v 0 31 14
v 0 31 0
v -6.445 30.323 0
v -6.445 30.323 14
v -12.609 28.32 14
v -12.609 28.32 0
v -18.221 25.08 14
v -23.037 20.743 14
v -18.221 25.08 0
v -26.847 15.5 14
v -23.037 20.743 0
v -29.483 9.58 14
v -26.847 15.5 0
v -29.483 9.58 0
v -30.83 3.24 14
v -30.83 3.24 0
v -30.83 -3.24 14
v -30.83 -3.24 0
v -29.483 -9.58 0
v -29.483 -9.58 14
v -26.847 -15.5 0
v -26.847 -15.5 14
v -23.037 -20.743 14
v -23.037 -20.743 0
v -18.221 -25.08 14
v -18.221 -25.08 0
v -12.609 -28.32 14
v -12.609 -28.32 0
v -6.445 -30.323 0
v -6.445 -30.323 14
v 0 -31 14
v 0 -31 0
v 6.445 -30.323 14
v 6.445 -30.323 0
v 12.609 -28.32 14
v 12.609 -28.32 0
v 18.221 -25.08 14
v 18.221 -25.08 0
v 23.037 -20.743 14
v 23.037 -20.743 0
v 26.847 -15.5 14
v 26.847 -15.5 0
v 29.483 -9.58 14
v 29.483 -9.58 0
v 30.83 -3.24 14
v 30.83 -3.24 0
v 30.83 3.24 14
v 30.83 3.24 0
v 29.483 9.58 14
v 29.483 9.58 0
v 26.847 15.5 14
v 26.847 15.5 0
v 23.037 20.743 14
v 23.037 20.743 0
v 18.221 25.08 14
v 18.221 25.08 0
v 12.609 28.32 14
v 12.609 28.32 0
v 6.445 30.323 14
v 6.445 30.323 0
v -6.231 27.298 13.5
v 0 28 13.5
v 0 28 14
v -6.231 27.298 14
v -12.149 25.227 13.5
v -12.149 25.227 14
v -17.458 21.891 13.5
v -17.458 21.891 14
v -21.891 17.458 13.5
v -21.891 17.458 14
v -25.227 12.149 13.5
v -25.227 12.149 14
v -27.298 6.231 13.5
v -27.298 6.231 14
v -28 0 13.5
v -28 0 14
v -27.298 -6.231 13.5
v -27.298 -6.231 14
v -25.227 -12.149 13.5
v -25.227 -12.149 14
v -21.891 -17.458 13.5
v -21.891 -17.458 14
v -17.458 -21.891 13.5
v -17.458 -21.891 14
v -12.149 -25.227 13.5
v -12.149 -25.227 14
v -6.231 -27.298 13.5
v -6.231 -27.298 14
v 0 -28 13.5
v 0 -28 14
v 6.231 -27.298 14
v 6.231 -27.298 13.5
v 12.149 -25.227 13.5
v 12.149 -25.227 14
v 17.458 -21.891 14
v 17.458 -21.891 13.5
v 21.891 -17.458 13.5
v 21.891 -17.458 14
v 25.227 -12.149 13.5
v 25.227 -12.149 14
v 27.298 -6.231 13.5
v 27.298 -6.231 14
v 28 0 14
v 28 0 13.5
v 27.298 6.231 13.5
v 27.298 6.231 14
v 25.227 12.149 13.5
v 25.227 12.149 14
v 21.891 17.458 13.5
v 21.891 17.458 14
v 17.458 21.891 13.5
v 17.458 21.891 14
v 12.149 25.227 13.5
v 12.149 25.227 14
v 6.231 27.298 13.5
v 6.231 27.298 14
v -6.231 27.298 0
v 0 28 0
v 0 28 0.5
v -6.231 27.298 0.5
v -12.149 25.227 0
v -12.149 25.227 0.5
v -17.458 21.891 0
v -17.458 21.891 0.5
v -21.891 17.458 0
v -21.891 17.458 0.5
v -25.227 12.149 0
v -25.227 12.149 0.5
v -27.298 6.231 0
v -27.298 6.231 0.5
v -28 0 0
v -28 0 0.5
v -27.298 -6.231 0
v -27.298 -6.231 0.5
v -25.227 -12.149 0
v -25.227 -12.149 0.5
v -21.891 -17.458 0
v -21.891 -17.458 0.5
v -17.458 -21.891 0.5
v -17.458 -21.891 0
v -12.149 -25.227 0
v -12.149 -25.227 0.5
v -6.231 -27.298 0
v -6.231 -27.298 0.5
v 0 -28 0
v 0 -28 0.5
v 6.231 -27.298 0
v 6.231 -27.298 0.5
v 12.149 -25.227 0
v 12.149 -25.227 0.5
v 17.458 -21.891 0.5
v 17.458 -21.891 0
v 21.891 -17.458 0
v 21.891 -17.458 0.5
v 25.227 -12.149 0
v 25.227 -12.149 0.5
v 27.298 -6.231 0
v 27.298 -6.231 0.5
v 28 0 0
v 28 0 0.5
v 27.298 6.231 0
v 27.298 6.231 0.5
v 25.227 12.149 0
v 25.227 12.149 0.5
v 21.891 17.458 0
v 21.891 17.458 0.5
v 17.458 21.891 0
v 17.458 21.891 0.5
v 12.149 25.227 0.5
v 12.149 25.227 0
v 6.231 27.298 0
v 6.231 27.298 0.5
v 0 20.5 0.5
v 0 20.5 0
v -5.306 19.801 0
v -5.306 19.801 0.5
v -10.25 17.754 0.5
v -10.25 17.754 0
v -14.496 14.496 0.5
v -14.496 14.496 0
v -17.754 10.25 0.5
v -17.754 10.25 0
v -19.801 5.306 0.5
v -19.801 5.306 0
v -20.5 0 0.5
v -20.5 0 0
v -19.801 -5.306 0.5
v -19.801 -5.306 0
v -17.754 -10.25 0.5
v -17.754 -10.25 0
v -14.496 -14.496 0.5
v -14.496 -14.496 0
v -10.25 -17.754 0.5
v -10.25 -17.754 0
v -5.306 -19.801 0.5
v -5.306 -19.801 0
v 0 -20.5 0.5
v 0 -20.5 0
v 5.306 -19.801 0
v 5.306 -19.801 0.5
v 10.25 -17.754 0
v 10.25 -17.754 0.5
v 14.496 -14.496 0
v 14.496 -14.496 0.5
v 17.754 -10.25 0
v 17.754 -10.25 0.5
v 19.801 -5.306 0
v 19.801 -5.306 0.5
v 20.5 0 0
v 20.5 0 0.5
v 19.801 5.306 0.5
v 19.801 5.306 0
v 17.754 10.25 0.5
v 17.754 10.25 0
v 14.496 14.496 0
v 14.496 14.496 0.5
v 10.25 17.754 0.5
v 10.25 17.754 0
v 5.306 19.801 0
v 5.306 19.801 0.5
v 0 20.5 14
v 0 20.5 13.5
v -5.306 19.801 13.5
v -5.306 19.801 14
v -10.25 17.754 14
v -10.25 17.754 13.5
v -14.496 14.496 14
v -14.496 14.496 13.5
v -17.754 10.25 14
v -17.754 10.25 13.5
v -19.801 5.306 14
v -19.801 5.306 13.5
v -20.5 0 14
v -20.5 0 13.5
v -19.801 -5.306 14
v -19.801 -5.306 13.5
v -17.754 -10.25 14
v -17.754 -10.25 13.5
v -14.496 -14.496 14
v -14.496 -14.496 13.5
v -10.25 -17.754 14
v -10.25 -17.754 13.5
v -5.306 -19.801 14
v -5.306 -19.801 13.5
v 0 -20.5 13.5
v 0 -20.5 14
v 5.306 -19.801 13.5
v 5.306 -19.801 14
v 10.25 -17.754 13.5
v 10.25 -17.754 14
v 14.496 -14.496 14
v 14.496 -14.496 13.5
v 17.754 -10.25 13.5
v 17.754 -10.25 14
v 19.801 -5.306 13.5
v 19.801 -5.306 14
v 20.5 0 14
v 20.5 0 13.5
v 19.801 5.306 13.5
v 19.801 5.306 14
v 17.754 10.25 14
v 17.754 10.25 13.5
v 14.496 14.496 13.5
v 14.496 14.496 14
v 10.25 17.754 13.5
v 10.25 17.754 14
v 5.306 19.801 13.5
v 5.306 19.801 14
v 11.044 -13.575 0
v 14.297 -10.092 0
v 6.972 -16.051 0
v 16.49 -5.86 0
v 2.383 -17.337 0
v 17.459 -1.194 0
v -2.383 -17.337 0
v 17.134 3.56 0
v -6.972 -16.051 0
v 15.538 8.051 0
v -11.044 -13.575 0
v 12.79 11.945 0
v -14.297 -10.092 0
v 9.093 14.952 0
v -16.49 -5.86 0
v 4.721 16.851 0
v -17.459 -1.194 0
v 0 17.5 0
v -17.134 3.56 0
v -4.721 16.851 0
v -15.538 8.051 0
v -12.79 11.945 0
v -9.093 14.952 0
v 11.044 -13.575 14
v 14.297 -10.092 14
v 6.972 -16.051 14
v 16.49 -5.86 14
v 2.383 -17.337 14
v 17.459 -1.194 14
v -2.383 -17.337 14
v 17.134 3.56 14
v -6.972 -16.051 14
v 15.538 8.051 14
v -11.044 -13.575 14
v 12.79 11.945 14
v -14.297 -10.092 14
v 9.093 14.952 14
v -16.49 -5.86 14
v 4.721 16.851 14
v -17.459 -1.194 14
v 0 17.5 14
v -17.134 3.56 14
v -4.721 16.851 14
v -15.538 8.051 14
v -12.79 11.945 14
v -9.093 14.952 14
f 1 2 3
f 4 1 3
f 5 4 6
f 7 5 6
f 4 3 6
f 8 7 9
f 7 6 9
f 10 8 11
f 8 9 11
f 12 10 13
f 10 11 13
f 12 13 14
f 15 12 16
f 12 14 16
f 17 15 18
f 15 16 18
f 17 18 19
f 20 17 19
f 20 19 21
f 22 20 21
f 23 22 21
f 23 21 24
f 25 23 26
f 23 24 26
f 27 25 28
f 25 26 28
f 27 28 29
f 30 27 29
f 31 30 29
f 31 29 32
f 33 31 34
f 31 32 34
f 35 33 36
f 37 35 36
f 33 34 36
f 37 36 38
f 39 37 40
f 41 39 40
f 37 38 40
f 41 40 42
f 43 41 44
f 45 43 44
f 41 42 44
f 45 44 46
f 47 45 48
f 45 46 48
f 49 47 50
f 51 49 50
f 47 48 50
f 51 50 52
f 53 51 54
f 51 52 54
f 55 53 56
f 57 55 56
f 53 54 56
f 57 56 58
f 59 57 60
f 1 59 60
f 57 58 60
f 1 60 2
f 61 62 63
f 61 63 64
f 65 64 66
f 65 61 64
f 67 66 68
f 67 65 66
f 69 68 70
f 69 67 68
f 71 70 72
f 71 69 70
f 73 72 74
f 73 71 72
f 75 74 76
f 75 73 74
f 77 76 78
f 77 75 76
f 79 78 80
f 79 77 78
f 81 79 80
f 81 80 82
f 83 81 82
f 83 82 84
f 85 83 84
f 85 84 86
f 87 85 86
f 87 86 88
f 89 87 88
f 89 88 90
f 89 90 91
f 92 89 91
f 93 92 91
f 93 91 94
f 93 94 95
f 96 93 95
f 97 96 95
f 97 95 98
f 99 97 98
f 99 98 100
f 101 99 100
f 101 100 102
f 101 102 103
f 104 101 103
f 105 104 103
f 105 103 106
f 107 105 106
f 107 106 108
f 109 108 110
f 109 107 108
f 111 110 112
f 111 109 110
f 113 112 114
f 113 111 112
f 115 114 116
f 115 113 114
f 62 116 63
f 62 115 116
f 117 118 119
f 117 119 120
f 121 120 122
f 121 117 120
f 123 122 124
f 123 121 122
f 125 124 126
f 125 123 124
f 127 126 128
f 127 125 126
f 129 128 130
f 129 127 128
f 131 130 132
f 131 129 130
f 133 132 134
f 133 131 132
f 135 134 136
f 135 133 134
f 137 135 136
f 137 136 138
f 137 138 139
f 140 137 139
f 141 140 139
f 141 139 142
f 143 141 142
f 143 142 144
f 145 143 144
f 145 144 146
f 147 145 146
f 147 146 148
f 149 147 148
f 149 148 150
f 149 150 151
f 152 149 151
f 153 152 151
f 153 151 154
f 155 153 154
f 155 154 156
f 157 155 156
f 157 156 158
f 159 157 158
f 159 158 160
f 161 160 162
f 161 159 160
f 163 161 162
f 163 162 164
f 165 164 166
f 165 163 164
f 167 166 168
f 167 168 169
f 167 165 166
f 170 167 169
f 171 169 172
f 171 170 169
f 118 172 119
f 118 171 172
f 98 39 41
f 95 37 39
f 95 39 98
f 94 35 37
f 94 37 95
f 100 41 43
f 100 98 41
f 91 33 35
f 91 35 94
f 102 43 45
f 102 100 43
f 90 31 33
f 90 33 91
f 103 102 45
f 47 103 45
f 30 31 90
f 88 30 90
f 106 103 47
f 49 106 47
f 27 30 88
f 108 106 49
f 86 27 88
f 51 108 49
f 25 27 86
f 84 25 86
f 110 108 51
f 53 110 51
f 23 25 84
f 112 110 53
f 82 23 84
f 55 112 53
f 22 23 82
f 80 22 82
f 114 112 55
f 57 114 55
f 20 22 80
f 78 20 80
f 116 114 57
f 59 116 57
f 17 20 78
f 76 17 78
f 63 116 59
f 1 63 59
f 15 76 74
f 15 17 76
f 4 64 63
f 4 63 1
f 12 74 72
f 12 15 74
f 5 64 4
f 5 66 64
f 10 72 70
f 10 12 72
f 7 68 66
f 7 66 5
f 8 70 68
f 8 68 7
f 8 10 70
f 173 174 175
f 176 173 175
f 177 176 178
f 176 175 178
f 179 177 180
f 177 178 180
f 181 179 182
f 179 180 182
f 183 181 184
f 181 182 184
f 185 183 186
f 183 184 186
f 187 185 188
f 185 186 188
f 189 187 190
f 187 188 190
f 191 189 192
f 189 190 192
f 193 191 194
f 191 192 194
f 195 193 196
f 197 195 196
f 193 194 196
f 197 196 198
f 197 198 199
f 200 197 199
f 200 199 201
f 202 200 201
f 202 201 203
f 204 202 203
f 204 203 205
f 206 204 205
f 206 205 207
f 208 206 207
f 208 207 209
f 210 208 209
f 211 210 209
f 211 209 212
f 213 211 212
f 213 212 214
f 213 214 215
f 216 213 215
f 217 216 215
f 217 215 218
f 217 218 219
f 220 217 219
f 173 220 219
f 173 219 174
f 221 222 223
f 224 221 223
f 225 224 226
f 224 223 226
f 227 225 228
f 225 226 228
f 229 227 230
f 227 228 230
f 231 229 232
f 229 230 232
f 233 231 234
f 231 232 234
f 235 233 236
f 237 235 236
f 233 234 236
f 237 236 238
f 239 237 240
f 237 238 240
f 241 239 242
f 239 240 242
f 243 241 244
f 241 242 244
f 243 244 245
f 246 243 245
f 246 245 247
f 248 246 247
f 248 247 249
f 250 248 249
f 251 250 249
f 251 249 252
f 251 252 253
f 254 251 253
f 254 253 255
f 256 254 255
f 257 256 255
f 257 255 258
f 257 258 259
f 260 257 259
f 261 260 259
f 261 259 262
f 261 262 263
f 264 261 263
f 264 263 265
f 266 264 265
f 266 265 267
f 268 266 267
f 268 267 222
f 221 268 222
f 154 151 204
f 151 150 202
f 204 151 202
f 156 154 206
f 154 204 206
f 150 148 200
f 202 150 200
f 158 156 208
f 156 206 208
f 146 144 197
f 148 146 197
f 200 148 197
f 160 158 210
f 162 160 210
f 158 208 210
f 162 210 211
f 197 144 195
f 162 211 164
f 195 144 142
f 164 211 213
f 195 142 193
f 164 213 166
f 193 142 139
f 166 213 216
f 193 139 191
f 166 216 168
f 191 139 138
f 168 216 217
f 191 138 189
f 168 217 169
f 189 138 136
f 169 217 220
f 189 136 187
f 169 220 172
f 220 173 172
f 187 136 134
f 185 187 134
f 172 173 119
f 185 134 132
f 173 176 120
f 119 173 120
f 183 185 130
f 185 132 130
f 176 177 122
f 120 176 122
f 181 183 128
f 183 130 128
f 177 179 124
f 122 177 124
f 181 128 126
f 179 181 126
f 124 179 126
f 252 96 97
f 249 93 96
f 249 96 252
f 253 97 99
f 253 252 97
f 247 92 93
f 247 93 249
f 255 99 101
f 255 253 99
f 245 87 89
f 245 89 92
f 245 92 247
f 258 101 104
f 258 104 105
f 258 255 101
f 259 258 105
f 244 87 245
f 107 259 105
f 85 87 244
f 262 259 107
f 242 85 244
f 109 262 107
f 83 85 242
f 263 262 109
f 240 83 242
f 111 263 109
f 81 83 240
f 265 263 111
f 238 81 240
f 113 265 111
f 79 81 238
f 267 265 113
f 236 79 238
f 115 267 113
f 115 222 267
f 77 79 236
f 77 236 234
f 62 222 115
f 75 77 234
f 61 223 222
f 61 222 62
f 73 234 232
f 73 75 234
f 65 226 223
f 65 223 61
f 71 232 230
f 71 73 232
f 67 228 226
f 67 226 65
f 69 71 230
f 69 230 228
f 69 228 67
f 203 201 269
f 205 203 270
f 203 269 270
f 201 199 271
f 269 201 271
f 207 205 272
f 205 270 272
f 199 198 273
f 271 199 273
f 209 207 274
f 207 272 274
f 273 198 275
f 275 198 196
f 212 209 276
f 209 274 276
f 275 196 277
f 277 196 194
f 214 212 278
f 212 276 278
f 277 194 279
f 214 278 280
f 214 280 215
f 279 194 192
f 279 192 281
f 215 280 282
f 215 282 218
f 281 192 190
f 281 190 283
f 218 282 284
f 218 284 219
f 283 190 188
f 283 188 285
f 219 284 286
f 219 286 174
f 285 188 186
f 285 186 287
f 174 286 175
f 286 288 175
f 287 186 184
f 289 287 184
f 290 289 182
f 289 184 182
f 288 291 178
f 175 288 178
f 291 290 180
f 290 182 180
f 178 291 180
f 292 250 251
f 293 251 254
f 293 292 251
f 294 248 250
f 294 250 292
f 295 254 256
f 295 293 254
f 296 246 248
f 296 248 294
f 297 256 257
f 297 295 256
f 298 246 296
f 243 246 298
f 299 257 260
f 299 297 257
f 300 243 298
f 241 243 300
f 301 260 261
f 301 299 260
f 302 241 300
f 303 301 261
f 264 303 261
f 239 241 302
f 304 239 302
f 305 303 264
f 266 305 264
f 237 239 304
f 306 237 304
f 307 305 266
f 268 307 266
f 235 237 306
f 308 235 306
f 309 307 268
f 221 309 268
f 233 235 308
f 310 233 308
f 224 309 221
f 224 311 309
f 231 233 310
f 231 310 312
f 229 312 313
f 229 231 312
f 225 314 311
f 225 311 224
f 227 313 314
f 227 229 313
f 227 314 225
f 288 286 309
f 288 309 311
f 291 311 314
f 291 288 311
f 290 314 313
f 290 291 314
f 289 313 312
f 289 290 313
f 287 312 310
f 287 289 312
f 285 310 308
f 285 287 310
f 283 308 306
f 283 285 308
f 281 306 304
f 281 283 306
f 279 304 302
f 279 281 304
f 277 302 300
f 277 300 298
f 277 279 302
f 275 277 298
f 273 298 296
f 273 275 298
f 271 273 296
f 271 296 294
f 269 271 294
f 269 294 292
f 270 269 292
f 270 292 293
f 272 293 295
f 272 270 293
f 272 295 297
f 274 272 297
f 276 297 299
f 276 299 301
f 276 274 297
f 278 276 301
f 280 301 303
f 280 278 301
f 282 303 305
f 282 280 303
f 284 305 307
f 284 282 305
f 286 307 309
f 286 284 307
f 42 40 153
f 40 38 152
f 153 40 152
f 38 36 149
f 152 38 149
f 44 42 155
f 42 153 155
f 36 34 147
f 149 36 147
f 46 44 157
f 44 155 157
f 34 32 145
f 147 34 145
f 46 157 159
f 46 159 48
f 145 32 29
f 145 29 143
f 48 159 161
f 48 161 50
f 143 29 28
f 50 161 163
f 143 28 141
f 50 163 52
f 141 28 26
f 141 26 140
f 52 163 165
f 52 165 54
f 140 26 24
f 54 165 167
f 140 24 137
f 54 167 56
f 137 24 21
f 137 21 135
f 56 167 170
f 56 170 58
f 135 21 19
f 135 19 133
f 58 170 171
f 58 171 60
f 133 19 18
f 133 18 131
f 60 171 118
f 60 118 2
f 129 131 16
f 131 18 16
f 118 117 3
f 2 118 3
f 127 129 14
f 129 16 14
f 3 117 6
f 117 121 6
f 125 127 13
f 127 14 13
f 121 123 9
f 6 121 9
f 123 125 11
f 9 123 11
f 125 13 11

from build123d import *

# Parameters (mm, degrees)
SKETCH1_R             = 31
SKETCH1_R_2           = 28
BOSS_EXTRUDE1_DEPTH   = 14
SKETCH1_R_3           = 20.5
SKETCH1_R_4           = 17.5
BOSS_EXTRUDE1_2_DEPTH = 14
BOSS_EXTRUDE2_START   = 0.5
SKETCH1_3_R           = 28
SKETCH1_3_R_2         = 20.5
BOSS_EXTRUDE2_DEPTH   = 13


with BuildPart() as part:
    # Sketch1 → Boss-Extrude1 (new body)
    with BuildSketch(Plane(origin=(0, 0, 0), x_dir=(0, 1, 0), z_dir=(0, 0, 1))):
        Circle(SKETCH1_R)
        Circle(SKETCH1_R_2, mode=Mode.SUBTRACT)
    extrude(amount=BOSS_EXTRUDE1_DEPTH)



with BuildPart() as body_2:
    # Sketch1 → Boss-Extrude1 2 (new body)
    with BuildSketch(Plane(origin=(0, 0, 0), x_dir=(0, 1, 0), z_dir=(0, 0, 1))):
        Circle(SKETCH1_R_3)
        Circle(SKETCH1_R_4, mode=Mode.SUBTRACT)
    extrude(amount=BOSS_EXTRUDE1_2_DEPTH)


with BuildPart() as part_1:
    add(part.part)

    add(body_2.part)  # Boss-Extrude2 merges body 2
    # Sketch1<3> → Boss-Extrude2 (add)
    with BuildSketch(Plane(origin=(0, 0, 0), x_dir=(0, 1, 0), z_dir=(0, 0, 1)).offset(BOSS_EXTRUDE2_START)):
        Circle(SKETCH1_3_R)
        Circle(SKETCH1_3_R_2, mode=Mode.SUBTRACT)
    extrude(amount=BOSS_EXTRUDE2_DEPTH)


solid = part_1.part
